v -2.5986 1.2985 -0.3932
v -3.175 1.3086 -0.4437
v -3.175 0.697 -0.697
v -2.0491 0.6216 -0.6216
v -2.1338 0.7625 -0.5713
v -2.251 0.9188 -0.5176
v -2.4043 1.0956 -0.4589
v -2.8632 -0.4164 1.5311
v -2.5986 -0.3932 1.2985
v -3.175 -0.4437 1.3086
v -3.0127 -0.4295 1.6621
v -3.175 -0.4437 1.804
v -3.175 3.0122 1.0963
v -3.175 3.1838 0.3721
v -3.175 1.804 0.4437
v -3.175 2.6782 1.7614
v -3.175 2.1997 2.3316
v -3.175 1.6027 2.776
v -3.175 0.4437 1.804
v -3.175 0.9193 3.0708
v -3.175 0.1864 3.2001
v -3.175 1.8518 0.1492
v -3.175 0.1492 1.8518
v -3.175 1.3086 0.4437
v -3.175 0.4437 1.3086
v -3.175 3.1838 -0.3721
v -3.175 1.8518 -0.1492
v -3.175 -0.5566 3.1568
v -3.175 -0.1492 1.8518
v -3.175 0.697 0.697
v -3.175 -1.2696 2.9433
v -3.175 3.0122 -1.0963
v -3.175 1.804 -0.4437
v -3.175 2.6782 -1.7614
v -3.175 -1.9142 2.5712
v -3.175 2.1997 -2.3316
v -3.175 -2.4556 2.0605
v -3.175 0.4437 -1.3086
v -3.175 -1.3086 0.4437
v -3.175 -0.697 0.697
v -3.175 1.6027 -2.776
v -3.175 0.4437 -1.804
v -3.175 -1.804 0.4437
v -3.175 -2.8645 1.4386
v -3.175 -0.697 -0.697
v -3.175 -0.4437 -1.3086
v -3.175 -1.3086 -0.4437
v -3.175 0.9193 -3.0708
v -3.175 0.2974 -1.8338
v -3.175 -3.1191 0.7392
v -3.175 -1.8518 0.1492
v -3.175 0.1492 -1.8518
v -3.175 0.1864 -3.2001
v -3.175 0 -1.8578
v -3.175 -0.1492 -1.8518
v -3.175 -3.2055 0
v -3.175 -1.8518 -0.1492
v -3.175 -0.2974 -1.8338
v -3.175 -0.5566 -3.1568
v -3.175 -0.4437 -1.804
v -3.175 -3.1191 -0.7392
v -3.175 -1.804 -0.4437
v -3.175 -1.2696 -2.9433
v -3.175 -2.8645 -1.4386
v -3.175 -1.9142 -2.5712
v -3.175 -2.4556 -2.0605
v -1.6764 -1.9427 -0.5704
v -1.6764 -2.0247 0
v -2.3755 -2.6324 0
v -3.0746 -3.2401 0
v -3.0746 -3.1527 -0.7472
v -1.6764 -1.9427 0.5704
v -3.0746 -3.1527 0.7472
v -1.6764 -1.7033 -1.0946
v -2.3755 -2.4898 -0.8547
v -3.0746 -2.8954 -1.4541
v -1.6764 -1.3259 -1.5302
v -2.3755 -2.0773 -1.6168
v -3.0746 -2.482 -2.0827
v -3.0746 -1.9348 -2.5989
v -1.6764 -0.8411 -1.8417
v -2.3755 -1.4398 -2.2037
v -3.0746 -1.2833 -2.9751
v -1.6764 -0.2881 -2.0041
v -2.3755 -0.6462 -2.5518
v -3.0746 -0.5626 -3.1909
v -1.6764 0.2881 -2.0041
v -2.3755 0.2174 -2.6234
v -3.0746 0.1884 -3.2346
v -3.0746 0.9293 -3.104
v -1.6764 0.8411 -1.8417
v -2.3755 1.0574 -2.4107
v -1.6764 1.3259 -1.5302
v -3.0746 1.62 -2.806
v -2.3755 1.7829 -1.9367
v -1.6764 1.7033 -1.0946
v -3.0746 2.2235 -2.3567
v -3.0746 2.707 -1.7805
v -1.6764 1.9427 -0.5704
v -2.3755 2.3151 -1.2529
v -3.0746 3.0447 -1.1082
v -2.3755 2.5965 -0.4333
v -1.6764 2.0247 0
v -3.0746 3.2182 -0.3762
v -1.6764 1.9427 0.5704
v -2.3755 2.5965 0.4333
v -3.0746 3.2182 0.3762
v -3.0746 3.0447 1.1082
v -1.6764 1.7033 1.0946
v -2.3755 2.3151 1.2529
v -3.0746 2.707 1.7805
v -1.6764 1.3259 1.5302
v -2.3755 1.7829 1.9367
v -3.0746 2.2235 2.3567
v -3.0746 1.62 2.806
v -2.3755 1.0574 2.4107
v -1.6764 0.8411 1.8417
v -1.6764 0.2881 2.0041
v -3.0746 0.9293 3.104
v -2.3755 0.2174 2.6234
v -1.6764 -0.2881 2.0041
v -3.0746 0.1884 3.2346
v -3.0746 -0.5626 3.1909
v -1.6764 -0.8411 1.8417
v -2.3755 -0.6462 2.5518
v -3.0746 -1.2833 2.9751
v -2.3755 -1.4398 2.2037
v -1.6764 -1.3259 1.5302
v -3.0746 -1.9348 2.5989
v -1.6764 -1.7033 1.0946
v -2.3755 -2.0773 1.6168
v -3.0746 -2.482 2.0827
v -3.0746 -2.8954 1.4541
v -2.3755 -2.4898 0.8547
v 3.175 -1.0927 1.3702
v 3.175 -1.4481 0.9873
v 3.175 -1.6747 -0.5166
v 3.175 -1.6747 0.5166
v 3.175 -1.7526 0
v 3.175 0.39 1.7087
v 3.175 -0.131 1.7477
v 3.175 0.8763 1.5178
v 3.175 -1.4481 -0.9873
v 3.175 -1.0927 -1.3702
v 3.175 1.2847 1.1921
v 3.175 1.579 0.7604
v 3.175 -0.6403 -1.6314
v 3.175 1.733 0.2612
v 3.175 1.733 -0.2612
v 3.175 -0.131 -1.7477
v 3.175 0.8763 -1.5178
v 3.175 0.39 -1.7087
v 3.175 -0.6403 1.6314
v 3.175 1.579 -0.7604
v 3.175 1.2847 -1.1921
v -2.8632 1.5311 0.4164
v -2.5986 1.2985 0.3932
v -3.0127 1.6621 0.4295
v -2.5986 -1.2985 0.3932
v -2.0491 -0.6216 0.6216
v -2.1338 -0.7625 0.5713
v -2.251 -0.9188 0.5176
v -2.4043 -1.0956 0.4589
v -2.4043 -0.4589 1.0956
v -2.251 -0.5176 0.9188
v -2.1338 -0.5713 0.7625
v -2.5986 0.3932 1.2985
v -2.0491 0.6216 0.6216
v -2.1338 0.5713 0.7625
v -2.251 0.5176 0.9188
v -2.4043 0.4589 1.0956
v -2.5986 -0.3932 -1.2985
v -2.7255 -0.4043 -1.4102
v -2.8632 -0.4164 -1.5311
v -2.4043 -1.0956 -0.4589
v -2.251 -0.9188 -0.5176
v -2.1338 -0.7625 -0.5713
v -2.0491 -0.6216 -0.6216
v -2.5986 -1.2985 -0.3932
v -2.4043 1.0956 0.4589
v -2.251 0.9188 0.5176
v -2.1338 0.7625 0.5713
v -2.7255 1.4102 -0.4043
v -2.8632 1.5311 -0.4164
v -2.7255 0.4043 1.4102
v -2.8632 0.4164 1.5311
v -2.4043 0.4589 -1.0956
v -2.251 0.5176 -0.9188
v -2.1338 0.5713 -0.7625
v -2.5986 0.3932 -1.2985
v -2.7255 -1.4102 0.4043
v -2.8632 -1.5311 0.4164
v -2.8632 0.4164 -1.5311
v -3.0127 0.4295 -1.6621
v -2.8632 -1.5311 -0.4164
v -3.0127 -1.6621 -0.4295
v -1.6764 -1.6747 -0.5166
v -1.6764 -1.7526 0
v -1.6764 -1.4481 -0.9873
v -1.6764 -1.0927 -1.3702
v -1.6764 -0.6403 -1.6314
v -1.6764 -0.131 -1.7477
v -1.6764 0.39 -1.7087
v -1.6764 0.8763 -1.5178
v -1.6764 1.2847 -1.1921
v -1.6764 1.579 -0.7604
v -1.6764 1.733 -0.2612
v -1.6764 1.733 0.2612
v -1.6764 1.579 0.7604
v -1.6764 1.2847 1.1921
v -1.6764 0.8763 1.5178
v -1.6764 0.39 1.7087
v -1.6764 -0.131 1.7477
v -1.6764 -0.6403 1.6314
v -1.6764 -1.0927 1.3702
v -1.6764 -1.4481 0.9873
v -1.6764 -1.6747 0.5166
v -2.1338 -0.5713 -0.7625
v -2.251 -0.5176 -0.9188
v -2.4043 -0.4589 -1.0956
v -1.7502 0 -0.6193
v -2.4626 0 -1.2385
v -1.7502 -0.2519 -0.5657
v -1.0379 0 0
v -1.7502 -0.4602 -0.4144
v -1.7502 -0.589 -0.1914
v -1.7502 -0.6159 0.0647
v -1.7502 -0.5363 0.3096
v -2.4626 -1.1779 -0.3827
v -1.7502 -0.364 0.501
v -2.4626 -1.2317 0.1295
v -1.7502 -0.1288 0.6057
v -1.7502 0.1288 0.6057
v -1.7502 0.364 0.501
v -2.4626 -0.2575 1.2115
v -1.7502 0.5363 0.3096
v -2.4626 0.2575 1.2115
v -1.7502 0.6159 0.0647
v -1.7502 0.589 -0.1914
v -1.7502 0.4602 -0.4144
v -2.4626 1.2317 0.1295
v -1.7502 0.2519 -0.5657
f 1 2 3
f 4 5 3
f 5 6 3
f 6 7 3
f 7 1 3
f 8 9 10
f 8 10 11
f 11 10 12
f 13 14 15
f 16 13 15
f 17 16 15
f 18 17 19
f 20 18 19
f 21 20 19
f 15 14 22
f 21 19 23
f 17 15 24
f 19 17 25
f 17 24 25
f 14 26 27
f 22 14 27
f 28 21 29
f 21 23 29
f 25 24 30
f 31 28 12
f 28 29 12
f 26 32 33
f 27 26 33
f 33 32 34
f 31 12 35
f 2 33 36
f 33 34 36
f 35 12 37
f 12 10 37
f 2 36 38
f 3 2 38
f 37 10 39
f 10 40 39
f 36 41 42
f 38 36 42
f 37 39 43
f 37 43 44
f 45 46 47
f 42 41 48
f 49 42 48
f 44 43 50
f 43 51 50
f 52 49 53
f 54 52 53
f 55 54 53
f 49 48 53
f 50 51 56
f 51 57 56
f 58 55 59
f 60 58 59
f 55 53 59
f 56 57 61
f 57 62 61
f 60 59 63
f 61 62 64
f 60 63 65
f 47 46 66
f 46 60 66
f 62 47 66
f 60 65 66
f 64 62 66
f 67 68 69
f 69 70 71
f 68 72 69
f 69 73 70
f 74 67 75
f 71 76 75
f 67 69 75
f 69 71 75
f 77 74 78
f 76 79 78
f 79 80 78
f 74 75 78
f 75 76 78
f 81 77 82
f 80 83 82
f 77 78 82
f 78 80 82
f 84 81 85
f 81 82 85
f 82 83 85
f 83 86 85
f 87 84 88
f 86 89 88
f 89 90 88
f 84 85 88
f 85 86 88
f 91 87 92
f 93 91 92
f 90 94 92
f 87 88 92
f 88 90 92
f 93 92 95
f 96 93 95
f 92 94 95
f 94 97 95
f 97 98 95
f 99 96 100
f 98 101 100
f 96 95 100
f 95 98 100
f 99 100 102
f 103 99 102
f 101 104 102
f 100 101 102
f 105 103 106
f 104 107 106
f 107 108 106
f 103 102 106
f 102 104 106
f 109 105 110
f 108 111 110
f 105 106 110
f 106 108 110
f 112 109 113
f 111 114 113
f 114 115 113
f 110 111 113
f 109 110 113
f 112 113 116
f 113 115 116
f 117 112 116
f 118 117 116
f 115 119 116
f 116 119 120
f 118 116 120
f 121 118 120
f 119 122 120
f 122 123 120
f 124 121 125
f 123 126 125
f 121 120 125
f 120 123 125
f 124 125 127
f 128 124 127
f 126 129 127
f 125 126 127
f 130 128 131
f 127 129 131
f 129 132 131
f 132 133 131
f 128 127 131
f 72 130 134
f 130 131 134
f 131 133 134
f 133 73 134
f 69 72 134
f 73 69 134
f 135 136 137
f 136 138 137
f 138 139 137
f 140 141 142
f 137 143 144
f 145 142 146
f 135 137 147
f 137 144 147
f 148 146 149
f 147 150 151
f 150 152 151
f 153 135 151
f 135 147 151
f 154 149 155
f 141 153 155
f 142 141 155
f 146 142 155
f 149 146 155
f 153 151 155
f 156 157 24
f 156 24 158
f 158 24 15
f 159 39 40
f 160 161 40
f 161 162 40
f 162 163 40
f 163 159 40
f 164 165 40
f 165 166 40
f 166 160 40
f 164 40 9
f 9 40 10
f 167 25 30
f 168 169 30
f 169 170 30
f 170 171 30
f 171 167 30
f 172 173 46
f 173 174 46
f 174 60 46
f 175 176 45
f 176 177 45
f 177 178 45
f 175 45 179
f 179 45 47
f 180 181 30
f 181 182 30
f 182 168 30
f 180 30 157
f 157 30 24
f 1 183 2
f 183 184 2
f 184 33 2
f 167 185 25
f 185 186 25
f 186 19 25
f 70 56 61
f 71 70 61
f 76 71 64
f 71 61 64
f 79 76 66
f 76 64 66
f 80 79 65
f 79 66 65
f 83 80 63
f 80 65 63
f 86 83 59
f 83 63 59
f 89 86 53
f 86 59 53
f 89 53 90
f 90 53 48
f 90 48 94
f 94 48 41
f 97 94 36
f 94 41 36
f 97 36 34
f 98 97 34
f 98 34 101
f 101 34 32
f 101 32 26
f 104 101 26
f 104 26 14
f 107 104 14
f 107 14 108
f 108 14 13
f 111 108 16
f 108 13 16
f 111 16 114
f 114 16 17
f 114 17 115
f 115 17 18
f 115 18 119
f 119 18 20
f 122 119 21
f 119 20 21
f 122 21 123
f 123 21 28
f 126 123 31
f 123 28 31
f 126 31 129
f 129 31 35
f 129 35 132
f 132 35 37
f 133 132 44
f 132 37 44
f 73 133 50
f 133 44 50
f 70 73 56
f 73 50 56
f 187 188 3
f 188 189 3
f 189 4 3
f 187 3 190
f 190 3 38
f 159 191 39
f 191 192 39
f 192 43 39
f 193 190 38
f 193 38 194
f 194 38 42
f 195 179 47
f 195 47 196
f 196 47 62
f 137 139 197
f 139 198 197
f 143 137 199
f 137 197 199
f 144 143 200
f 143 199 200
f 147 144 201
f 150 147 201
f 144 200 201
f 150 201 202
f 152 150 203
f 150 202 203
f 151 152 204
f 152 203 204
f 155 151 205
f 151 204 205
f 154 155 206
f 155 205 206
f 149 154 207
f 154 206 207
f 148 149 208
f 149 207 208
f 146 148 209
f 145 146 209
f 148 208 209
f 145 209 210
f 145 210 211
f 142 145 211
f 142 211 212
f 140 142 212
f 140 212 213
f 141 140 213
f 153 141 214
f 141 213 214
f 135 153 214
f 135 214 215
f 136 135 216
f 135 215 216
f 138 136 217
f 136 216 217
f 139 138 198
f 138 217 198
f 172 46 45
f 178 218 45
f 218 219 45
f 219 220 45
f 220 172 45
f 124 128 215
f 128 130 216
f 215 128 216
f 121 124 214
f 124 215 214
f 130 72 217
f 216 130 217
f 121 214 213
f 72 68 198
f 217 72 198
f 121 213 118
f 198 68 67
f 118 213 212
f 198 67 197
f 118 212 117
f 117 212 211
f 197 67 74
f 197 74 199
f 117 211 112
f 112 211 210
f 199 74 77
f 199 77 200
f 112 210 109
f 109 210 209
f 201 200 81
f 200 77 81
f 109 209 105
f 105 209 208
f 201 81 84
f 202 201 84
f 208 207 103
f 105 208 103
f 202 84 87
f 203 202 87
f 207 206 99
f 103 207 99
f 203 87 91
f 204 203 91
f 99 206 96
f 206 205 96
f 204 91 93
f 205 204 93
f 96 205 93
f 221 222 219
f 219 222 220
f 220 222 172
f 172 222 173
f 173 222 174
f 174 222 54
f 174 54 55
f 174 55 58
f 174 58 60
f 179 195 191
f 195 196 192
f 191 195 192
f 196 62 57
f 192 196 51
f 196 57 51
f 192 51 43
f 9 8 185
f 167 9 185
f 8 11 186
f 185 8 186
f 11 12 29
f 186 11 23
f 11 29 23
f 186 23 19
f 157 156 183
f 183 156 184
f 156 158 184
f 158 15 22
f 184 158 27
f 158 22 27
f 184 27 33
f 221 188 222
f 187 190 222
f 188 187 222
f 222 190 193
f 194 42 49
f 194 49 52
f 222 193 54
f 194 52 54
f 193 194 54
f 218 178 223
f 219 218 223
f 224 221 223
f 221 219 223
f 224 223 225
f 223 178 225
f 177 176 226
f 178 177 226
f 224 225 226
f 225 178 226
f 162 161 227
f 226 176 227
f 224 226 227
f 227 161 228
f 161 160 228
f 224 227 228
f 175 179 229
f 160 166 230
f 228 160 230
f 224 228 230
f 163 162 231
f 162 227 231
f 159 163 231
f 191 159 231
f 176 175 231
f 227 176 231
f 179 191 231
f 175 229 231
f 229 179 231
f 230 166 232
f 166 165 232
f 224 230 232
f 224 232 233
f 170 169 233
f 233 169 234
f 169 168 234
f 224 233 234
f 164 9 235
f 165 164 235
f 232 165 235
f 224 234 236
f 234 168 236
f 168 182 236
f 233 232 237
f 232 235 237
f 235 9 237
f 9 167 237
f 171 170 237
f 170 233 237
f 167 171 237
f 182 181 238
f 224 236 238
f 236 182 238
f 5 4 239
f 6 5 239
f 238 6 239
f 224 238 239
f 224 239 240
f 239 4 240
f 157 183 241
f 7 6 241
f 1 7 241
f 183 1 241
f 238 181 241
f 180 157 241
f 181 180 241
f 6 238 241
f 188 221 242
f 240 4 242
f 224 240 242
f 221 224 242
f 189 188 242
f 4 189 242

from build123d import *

# Parameters (mm, degrees)
CUT_EXTRUDE1_REACH = 9.904
CIRPATTERN1_COUNT  = 4
DRAFT1_ANGLE       = 5
CHAMFER1_SIZE      = 0.133096
CHAMFER1_SIZE2     = 0.121906137


with BuildPart() as part:
    # Sketch2 → Revolve1 (revolve)
    with BuildSketch(Plane.XY, mode=Mode.PRIVATE) as revolve1_sk:
        Polygon((-3.175, 0), (3.175, 0), (3.175, 1.7526), (-1.6764, 1.7526), (-1.6764, 2.024686895), (-3.175, 3.3274), align=None)
    revolve(revolve1_sk.sketch.rotate(Axis((-3.175, 0, 0), (1, 0, 0)), 180), axis=Axis((-3.175, 0, 0), (1, 0, 0)))

    # Cut-Extrude1: up to this cone (the profile starts inside it)
    cut_extrude1_end = Plane(origin=(-3.175, 0, 0), z_dir=(-1, 0, 0)).offset(-2.137134931) * Cone(1e-06, 12.516790067, 14.398918853, align=(Align.CENTER, Align.CENTER, Align.MIN), mode=Mode.PRIVATE)
    # Sketch3 → Cut-Extrude1 (cut, up to the surface)
    with BuildSketch(Plane.ZY.offset(3.175), mode=Mode.PRIVATE) as cut_extrude1_sk1:
        with BuildLine():
            Line((0, 0), (2.218266667, 0))
            ThreePointArc((2.218266667, 0), (2.207033704, 0.22295568), (2.173448579, 0.443653333))
            Line((2.173448579, 0.443653333), (1.308550956, 0.443653333))
            Line((1.308550956, 0.443653333), (0.696975982, 0.696975982))
            Line((0.696975982, 0.696975982), (0.443653333, 1.308550956))
            Line((0.443653333, 1.308550956), (0.443653333, 2.173448579))
            ThreePointArc((0.443653333, 2.173448579), (0.22295568, 2.207033704), (0, 2.218266667))
            Line((0, 2.218266667), (0, 0))
        make_face()
    cut_extrude1_tool1 = extrude(cut_extrude1_sk1.sketch, amount=-CUT_EXTRUDE1_REACH, mode=Mode.PRIVATE) & cut_extrude1_end
    cut_extrude1 = cut_extrude1_tool1.solids().sort_by_distance((-3.175, 1.109133, 0.031371))[0]
    add(cut_extrude1, mode=Mode.SUBTRACT)

    # CirPattern1: Cut-Extrude1 ×4 about axis
    cirpattern1_axis = Axis((0, 0, 0), (1, 0, 0))
    for i in range(1, CIRPATTERN1_COUNT):
        add(cut_extrude1.rotate(cirpattern1_axis, i * 360 / CIRPATTERN1_COUNT), mode=Mode.SUBTRACT)

    # Draft1
    draft1_faces = [part.faces().sort_by_distance(p)[0] for p in [
        (-2.99204002, 0.443653333, -1.474018435),
        (-2.764573893, 0.582482874, -0.973386795),
        (-2.764573893, 0.973386795, -0.582482874),
        (-2.99204002, 1.474018435, -0.443653333),
        (-2.99204002, 1.474018435, 0.443653333),
        (-2.764573893, 0.973386795, 0.582482874),
        (-2.764573893, 0.582482874, 0.973386795),
        (-2.99204002, 0.443653333, 1.474018435),
        (-2.99204002, -0.443653333, 1.474018435),
        (-2.764573893, -0.582482874, 0.973386795),
        (-2.764573893, -0.973386795, 0.582482874),
        (-2.99204002, -1.474018435, 0.443653333),
        (-2.99204002, -1.474018435, -0.443653333),
        (-2.764573893, -0.973386795, -0.582482874),
        (-2.764573893, -0.582482874, -0.973386795),
        (-2.99204002, -0.443653333, -1.474018435),
    ]]
    draft(draft1_faces, Plane(origin=(-3.175, 0, 0), x_dir=(0, -1, 0), z_dir=(-1, 0, 0)), DRAFT1_ANGLE)

    # Chamfer1
    chamfer1_edges = [part.edges().sort_by_distance(p)[0] for p in [
        (-3.175, 3.3274, 0),
    ]]
    chamfer1_side = [part.faces().sort_by_distance(p)[0] for p in [
        (-2.4257, 2.676043447, 0),
    ]]
    chamfer(chamfer1_edges, length=CHAMFER1_SIZE, length2=CHAMFER1_SIZE2, reference=chamfer1_side[0])


solid = part.part
